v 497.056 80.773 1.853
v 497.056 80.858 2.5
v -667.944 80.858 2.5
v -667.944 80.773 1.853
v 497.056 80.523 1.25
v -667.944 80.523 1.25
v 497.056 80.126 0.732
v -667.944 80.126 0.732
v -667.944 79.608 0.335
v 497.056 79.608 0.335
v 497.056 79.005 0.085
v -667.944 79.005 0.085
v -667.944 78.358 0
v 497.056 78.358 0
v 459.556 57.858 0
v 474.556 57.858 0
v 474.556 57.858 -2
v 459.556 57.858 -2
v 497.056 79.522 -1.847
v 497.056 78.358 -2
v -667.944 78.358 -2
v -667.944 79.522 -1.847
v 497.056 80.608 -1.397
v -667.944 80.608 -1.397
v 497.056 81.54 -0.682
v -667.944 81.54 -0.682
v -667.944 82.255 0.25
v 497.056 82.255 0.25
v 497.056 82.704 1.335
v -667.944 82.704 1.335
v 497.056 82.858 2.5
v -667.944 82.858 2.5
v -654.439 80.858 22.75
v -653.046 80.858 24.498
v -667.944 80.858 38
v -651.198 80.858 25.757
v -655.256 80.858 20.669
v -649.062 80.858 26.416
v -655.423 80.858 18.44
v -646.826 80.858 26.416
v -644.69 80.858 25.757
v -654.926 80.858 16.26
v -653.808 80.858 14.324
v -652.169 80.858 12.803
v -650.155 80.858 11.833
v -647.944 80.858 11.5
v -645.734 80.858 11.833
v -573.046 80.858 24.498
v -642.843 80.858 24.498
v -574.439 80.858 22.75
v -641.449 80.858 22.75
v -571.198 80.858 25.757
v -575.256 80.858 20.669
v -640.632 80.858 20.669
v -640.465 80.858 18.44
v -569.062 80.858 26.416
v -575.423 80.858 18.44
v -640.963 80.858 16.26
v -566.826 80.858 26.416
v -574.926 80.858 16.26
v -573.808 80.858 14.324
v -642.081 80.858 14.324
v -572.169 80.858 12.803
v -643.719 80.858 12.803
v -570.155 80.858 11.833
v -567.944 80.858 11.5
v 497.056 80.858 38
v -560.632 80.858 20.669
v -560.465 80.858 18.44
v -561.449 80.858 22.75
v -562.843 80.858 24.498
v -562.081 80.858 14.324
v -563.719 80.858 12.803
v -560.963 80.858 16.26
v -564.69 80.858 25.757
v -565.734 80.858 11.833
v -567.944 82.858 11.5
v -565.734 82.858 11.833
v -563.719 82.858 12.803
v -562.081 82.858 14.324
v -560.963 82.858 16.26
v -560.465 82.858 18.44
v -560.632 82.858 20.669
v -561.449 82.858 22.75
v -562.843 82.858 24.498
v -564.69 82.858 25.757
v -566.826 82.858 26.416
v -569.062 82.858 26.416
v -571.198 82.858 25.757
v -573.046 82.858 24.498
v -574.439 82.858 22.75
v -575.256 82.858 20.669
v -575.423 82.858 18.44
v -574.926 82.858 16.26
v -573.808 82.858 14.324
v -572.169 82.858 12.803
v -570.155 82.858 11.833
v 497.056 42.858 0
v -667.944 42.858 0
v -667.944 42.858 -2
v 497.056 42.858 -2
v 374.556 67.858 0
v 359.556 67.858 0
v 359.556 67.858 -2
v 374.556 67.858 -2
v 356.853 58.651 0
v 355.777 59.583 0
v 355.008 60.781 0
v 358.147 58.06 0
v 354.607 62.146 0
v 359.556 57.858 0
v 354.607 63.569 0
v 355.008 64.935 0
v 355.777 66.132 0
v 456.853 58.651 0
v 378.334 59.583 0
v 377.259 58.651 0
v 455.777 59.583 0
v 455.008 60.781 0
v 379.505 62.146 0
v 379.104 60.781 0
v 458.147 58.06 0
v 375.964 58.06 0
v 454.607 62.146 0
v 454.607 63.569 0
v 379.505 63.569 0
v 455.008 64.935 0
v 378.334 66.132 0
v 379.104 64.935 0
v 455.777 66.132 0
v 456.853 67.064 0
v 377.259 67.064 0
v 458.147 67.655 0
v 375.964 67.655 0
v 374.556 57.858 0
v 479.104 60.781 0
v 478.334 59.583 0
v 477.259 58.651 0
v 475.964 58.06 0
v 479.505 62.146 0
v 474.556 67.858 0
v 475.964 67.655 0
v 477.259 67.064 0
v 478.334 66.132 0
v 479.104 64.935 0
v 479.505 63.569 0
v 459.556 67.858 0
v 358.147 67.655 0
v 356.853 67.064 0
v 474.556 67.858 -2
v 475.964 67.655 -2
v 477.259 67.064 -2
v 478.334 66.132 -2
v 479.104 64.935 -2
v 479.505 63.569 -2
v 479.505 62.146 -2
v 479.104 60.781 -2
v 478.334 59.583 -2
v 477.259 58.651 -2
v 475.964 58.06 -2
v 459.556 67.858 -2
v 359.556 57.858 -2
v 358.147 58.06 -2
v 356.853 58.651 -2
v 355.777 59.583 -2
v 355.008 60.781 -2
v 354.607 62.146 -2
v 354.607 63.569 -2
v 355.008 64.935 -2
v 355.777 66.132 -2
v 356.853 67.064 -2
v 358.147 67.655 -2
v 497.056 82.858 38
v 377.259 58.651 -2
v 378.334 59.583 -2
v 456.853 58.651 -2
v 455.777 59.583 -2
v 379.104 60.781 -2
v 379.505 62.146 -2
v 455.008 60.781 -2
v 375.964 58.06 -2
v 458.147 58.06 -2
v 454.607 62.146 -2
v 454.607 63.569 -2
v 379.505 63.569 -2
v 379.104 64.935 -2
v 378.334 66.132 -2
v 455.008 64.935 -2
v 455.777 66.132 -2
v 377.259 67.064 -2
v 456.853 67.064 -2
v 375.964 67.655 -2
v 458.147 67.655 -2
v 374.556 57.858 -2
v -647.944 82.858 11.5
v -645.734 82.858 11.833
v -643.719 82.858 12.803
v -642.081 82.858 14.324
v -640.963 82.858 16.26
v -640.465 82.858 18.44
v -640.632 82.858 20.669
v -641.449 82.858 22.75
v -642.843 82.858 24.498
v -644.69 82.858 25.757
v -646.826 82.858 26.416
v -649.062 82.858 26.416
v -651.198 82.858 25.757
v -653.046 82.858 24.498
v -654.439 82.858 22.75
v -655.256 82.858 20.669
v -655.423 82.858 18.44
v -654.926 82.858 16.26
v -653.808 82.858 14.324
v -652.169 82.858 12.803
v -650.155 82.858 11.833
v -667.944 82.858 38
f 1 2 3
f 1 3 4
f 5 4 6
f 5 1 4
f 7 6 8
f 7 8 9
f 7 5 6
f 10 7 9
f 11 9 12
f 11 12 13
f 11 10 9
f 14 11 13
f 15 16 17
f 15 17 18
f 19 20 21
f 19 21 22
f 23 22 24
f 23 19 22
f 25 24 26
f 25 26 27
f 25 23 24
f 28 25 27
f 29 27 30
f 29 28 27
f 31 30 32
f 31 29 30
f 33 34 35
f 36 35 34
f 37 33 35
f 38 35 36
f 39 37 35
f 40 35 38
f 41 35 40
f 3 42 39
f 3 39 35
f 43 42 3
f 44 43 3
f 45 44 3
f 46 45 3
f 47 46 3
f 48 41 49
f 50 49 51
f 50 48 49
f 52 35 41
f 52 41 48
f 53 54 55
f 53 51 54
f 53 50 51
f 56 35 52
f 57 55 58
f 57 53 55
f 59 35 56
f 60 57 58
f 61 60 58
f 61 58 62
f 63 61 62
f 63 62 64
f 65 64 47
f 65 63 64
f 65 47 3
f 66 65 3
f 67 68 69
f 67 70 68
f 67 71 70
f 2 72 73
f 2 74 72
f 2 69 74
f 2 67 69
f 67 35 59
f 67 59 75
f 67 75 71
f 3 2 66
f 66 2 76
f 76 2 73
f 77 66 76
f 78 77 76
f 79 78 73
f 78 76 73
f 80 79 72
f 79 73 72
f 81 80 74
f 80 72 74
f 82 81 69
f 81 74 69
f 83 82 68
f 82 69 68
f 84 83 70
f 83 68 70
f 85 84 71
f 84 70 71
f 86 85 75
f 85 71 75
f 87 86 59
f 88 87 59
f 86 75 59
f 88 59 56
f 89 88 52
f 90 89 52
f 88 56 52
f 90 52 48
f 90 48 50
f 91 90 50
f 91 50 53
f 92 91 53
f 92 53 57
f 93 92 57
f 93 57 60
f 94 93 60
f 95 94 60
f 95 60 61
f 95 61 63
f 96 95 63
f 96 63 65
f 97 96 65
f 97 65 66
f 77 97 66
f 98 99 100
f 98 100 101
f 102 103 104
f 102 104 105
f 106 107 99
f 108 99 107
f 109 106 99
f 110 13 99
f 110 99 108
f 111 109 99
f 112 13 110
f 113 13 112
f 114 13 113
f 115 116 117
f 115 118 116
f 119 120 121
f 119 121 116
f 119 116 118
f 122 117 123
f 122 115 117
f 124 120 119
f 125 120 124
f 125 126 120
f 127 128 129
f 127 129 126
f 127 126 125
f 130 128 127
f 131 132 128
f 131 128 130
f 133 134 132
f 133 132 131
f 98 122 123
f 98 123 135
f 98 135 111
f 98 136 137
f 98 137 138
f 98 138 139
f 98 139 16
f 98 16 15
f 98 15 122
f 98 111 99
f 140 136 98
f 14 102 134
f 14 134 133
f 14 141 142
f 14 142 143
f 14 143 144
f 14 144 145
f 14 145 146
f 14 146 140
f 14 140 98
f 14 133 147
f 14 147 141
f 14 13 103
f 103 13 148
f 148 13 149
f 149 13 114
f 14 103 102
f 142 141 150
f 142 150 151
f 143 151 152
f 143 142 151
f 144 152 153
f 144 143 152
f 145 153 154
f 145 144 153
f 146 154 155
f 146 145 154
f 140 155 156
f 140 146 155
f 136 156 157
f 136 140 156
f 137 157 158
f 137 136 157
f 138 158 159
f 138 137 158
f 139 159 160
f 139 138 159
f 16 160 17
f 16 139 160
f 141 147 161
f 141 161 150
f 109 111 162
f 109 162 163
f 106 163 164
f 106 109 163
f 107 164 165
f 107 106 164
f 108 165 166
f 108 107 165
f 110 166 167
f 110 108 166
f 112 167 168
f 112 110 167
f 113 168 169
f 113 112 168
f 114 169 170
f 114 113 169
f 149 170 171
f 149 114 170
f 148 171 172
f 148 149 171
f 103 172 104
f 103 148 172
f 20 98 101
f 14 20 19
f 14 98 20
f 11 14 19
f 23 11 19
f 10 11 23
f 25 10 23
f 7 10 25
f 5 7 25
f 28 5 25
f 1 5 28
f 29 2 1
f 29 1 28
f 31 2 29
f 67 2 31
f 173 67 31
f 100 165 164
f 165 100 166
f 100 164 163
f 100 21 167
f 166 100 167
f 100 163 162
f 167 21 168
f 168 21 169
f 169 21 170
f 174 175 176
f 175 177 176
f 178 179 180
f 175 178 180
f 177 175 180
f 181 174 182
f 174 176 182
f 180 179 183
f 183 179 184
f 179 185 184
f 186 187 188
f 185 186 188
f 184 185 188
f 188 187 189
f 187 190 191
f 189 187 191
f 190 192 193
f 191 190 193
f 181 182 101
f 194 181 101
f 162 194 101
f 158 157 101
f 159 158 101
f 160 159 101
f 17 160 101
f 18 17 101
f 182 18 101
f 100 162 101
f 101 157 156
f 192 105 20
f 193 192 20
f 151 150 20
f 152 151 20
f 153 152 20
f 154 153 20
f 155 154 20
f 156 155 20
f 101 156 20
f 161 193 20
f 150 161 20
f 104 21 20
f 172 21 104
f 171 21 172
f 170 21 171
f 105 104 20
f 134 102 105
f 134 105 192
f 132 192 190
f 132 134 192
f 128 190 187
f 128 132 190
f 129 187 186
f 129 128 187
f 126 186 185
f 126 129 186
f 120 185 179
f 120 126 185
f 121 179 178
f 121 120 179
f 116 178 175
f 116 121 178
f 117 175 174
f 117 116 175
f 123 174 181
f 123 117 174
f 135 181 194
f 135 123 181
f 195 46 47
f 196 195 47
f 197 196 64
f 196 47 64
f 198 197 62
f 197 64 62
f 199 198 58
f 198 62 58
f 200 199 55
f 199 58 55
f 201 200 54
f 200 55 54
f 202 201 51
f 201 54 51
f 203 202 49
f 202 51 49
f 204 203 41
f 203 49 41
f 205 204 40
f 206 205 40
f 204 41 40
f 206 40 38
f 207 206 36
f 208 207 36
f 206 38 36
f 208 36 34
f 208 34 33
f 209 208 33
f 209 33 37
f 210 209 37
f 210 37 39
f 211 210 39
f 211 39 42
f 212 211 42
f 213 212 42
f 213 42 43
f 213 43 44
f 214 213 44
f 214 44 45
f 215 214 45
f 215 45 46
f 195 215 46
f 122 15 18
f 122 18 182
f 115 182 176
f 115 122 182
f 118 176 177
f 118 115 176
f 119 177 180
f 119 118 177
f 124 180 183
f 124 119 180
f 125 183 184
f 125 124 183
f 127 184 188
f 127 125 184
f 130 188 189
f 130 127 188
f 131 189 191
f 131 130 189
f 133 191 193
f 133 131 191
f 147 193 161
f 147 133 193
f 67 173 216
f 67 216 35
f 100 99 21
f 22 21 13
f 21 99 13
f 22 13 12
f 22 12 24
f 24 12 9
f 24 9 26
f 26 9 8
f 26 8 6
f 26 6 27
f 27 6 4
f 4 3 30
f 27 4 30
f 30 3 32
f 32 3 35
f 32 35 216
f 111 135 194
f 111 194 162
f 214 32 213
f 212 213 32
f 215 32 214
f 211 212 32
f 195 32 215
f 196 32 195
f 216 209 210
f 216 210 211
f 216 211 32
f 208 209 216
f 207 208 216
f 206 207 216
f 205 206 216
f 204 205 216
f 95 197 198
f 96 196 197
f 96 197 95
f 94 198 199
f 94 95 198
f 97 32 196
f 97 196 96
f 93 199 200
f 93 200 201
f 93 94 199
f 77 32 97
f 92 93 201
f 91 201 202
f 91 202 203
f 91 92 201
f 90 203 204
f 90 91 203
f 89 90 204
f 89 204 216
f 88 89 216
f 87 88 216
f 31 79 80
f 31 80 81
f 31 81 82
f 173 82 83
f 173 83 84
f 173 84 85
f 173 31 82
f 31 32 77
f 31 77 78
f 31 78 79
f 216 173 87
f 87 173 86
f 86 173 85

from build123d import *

# Parameters (mm, degrees)
SKETCH1_W                    = 1165
SKETCH1_H                    = 40
BASE_FLANGE1_DEPTH           = 2
EDGE_FLANGE1_STRIP_W         = 13
EDGE_FLANGE1_STRIP_H         = 2
EDGE_FLANGE1_STRIP_CUT_DEPTH = 1165
EDGE_FLANGE1_DEPTH           = 1165
SKETCH9_R                    = 7.5
CUT_EXTRUDE1_DEPTH           = 671.102657441


# Sheet-metal steps are written as plain solids
with BuildPart() as part:
    # Sketch1 → Base-Flange1 (new body)
    with BuildSketch(Plane.XY):
        with Locations((-85.444287729, 62.85774027)):
            Rectangle(SKETCH1_W, SKETCH1_H)
        with BuildLine():
            Line((474.555712271, 57.85774027), (459.555712271, 57.85774027))
            ThreePointArc((459.555712271, 57.85774027), (454.555712271, 62.85774027), (459.555712271, 67.85774027))
            Line((459.555712271, 67.85774027), (474.555712271, 67.85774027))
            ThreePointArc((474.555712271, 67.85774027), (479.555712271, 62.85774027), (474.555712271, 57.85774027))
        make_face(mode=Mode.SUBTRACT)
        with BuildLine():
            Line((374.555712271, 57.85774027), (359.555712271, 57.85774027))
            ThreePointArc((359.555712271, 57.85774027), (354.555712271, 62.85774027), (359.555712271, 67.85774027))
            Line((359.555712271, 67.85774027), (374.555712271, 67.85774027))
            ThreePointArc((374.555712271, 67.85774027), (379.555712271, 62.85774027), (374.555712271, 57.85774027))
        make_face(mode=Mode.SUBTRACT)
    extrude(amount=-BASE_FLANGE1_DEPTH)

    # Edge-Flange1 strip (across the edge) → Edge-Flange1 strip cut (cut)
    with BuildSketch(Plane(origin=(497.055712271, 82.85774027, 0), x_dir=(0, -1, 0), z_dir=(-1, 0, 0))):
        with Locations((-2, -1)):
            Rectangle(EDGE_FLANGE1_STRIP_W, EDGE_FLANGE1_STRIP_H)
    extrude(amount=EDGE_FLANGE1_STRIP_CUT_DEPTH, mode=Mode.SUBTRACT)

    # Edge-Flange1 section (across the edge) → Edge-Flange1 (add)
    with BuildSketch(Plane(origin=(497.055712271, 82.85774027, 0), x_dir=(0, -1, 0), z_dir=(-1, 0, 0))):
        with BuildLine():
            Line((0, 2.5), (0, 38))
            Line((0, 38), (2, 38))
            Line((2, 38), (2, 2.5))
            ThreePointArc((2, 2.5), (2.732233047, 0.732233047), (4.5, 0))
            Line((4.5, 0), (4.5, -2))
            ThreePointArc((4.5, -2), (1.318019485, -0.681980515), (0, 2.5))
        make_face()
    extrude(amount=EDGE_FLANGE1_DEPTH)

    # Sketch9 → Cut-Extrude1 (cut, through all)
    with BuildSketch(Plane.XZ.offset(-80.85774027)):
        with Locations(Location((-647.944287729, 19, 0), (0, 0, 270))):
            Circle(SKETCH9_R)
        with Locations(Location((-567.944287729, 19, 0), (0, 0, 270))):
            Circle(SKETCH9_R)
    extrude(amount=-CUT_EXTRUDE1_DEPTH, mode=Mode.SUBTRACT)


solid = part.part
